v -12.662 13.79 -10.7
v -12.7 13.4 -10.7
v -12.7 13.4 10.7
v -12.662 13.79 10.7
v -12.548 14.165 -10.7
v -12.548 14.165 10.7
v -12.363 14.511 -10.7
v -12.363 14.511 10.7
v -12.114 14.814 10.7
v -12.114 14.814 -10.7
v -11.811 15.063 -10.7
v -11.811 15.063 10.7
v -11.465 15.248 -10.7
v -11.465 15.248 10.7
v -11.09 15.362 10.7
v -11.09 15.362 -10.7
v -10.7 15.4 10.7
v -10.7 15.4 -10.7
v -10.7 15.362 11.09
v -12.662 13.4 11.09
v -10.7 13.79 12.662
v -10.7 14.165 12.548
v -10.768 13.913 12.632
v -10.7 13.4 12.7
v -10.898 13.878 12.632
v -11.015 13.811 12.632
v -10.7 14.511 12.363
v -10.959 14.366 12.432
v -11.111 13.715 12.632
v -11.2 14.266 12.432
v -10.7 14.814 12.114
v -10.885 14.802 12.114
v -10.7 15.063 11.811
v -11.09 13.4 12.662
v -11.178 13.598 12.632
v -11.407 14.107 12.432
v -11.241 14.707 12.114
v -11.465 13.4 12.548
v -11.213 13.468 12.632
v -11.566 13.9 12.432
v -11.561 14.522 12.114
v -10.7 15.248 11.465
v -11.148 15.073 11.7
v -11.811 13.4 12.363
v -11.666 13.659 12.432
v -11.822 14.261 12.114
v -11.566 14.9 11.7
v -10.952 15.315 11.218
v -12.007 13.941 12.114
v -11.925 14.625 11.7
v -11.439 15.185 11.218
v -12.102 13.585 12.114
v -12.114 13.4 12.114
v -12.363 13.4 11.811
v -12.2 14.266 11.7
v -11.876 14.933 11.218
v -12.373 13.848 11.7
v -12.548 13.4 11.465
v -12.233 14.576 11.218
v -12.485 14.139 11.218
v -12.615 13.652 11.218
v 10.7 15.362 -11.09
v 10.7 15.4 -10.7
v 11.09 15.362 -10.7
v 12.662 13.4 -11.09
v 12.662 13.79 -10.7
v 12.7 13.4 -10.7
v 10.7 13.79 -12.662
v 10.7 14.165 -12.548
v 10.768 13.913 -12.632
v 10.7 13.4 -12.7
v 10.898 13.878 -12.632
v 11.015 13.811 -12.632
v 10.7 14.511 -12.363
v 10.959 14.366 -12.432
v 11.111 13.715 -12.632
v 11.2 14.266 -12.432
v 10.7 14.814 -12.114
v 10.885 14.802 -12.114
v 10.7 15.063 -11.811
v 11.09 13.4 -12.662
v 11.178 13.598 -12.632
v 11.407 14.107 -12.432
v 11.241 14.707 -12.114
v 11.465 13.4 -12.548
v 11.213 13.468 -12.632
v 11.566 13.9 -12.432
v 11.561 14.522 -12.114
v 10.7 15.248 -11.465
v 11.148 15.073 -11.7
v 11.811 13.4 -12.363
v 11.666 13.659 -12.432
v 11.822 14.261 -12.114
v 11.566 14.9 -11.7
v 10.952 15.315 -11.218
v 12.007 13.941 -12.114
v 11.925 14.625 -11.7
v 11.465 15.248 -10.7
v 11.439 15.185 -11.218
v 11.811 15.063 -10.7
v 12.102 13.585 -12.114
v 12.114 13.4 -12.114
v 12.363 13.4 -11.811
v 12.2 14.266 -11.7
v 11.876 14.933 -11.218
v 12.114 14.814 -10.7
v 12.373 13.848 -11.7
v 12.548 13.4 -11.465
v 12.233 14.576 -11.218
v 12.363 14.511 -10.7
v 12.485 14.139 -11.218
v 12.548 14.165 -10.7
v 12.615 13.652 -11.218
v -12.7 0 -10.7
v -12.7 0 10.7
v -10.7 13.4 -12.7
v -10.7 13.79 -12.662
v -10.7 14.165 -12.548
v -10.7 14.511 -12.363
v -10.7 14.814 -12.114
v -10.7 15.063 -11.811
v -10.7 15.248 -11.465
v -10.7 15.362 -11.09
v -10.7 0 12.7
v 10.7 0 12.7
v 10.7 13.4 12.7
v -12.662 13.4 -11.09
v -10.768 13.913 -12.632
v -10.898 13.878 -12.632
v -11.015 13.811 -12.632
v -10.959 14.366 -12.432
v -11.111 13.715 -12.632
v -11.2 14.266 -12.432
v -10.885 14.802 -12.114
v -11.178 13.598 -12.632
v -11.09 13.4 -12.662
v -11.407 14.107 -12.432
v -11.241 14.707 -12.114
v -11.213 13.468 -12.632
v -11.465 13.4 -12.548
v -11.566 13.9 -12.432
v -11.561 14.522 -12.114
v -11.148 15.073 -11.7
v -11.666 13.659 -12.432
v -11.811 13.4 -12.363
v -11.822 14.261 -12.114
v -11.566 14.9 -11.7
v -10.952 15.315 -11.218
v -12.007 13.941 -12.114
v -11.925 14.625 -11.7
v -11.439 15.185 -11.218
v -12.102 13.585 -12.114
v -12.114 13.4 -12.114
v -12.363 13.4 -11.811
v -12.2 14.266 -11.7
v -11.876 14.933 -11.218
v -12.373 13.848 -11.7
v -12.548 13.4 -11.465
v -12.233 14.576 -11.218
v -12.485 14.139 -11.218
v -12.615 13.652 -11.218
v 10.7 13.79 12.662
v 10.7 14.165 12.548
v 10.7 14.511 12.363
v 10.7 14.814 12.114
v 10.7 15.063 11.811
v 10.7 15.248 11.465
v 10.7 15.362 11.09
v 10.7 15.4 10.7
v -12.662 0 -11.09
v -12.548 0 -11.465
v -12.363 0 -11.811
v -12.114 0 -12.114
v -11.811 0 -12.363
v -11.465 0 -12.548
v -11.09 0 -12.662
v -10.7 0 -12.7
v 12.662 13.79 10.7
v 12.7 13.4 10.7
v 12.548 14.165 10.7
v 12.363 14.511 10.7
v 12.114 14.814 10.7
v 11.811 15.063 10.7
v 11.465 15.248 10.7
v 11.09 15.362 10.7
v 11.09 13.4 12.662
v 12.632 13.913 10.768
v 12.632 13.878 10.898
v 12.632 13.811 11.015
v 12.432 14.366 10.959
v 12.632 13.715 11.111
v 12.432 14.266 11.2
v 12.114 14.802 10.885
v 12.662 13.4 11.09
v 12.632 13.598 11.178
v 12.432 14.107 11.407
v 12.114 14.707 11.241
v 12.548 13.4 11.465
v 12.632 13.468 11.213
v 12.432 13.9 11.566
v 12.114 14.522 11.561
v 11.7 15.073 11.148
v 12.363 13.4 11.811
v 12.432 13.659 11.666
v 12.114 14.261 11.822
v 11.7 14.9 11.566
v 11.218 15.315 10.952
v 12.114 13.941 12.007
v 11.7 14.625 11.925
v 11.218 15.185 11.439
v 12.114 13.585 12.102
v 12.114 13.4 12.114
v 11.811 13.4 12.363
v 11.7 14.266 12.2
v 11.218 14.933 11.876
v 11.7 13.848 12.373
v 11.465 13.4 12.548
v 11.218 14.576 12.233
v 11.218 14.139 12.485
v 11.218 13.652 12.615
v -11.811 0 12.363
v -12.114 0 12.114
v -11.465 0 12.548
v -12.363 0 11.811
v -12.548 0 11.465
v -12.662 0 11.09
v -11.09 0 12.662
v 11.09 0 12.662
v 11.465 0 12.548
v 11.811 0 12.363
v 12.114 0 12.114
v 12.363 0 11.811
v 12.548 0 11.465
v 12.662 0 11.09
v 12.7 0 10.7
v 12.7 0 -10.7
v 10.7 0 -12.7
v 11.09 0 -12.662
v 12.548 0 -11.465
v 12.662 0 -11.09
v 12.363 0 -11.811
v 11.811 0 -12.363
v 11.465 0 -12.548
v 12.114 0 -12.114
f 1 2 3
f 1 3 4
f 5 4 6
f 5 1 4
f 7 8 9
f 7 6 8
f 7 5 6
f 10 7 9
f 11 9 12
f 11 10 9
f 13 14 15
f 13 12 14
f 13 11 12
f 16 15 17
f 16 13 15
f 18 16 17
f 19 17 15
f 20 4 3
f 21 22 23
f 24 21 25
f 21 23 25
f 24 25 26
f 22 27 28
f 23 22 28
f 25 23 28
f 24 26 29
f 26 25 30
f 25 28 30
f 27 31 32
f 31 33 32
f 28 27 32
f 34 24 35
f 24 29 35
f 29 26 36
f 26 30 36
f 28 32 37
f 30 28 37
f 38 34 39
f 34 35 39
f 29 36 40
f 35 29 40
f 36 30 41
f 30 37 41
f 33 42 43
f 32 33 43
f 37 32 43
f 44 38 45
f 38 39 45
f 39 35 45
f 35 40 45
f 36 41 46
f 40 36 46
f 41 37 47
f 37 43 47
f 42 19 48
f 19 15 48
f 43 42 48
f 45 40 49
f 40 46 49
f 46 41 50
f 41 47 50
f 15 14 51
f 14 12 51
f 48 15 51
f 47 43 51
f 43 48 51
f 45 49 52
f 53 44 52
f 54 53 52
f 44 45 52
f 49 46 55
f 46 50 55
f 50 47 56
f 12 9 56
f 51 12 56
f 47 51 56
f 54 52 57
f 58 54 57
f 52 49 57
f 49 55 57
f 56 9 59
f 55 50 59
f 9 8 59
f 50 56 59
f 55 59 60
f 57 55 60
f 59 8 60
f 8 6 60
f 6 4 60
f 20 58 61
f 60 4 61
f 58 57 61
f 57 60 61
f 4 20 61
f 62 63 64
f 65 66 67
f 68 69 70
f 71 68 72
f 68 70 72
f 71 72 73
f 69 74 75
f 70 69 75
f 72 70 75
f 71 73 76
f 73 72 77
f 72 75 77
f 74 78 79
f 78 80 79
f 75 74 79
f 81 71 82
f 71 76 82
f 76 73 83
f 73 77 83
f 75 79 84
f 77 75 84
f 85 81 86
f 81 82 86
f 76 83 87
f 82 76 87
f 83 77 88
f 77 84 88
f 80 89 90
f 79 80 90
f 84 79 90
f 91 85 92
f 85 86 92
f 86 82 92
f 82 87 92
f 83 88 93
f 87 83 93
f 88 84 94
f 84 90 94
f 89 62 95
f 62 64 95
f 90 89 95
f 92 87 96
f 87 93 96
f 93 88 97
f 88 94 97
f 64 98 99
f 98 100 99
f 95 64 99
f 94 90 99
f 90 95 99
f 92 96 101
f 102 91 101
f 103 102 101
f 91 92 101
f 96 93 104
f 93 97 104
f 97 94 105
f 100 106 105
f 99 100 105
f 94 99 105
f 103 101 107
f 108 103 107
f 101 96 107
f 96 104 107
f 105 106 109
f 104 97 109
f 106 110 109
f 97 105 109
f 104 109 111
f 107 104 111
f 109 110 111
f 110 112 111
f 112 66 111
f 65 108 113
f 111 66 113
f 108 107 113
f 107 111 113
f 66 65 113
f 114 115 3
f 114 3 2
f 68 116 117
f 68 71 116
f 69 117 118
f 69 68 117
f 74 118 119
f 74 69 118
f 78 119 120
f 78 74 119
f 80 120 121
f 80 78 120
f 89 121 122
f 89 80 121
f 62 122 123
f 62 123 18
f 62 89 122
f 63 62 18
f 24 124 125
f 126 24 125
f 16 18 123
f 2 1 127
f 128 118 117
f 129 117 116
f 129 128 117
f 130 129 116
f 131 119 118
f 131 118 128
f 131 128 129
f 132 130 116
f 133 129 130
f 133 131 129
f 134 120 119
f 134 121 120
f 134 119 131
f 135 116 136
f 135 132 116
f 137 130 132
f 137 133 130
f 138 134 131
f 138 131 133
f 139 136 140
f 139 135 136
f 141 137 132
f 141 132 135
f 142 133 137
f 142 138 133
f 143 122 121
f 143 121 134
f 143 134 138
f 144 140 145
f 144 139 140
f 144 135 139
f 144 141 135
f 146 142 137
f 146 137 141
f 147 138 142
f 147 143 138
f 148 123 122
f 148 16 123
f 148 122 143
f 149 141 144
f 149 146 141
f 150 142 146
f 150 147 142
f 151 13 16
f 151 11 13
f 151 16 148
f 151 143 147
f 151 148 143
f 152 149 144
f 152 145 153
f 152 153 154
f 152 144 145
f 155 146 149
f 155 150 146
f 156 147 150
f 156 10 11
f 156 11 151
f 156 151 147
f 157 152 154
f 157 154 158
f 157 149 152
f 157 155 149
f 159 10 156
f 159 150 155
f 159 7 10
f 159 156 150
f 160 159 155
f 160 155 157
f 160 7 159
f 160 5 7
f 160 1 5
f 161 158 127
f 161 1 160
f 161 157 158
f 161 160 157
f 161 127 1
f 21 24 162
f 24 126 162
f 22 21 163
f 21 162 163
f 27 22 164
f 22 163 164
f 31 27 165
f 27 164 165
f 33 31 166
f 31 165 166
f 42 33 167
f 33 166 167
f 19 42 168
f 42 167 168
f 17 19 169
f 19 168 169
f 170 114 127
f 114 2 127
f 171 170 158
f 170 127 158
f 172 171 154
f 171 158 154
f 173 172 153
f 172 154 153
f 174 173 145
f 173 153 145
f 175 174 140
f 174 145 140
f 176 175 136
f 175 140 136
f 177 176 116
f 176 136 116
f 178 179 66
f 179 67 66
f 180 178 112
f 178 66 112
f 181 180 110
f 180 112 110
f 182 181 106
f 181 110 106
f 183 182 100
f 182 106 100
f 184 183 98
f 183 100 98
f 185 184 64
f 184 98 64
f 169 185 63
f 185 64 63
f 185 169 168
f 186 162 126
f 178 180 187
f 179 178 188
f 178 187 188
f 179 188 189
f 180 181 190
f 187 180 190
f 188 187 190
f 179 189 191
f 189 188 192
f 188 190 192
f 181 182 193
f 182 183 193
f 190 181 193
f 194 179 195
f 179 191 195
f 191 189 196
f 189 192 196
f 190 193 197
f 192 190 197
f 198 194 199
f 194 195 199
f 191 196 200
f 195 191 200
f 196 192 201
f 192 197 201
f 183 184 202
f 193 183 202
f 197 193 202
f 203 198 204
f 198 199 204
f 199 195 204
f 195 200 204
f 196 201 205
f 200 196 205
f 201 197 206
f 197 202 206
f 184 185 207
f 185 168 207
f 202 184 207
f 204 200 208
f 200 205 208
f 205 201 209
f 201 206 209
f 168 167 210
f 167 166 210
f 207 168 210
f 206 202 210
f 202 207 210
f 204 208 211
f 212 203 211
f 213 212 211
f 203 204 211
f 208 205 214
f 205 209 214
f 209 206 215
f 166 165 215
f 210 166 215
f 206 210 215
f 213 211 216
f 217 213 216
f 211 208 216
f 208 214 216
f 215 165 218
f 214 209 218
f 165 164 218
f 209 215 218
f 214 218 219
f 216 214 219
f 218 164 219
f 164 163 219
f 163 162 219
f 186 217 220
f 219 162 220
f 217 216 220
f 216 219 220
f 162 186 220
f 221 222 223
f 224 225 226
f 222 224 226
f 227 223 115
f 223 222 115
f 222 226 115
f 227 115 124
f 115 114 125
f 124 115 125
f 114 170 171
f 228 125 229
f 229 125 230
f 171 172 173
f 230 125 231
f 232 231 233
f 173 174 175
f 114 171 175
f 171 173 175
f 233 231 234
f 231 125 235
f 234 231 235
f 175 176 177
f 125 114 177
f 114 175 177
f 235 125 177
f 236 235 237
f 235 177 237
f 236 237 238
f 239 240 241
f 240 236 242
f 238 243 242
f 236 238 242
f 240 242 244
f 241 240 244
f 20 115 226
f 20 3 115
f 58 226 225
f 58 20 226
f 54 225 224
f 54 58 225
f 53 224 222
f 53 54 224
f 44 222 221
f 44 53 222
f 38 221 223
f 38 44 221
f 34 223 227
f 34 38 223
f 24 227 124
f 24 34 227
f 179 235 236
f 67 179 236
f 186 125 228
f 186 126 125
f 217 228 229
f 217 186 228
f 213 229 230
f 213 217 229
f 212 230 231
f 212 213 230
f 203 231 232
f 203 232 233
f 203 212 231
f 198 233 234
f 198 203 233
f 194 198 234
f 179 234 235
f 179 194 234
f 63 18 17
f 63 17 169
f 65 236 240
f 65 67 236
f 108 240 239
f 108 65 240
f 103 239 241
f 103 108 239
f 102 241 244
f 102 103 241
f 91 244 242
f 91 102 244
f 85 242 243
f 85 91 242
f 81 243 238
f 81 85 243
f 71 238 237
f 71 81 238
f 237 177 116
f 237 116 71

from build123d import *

# Parameters (mm, degrees)
SKETCH1_W           = 25.4
SKETCH1_H           = 25.4
BOSS_EXTRUDE1_DEPTH = 15.4
FILLET1_R           = 2


with BuildPart() as part:
    # Sketch1 → Boss-Extrude1 (new body)
    with BuildSketch(Plane(origin=(0, 0, 0), x_dir=(1, 0, 0), z_dir=(0, 1, 0))):
        Rectangle(SKETCH1_W, SKETCH1_H)
    extrude(amount=BOSS_EXTRUDE1_DEPTH)

    # Fillet1
    fillet1_edges = [part.edges().sort_by_distance(p)[0] for p in [
        (-12.7, 15.4, 0),
        (0, 15.4, 12.7),
        (12.7, 15.4, 0),
        (0, 15.4, -12.7),
        (12.7, 7.7, 12.7),
        (-12.7, 7.7, 12.7),
        (-12.7, 7.7, -12.7),
        (12.7, 7.7, -12.7),
    ]]
    fillet(fillet1_edges, radius=FILLET1_R)


solid = part.part
